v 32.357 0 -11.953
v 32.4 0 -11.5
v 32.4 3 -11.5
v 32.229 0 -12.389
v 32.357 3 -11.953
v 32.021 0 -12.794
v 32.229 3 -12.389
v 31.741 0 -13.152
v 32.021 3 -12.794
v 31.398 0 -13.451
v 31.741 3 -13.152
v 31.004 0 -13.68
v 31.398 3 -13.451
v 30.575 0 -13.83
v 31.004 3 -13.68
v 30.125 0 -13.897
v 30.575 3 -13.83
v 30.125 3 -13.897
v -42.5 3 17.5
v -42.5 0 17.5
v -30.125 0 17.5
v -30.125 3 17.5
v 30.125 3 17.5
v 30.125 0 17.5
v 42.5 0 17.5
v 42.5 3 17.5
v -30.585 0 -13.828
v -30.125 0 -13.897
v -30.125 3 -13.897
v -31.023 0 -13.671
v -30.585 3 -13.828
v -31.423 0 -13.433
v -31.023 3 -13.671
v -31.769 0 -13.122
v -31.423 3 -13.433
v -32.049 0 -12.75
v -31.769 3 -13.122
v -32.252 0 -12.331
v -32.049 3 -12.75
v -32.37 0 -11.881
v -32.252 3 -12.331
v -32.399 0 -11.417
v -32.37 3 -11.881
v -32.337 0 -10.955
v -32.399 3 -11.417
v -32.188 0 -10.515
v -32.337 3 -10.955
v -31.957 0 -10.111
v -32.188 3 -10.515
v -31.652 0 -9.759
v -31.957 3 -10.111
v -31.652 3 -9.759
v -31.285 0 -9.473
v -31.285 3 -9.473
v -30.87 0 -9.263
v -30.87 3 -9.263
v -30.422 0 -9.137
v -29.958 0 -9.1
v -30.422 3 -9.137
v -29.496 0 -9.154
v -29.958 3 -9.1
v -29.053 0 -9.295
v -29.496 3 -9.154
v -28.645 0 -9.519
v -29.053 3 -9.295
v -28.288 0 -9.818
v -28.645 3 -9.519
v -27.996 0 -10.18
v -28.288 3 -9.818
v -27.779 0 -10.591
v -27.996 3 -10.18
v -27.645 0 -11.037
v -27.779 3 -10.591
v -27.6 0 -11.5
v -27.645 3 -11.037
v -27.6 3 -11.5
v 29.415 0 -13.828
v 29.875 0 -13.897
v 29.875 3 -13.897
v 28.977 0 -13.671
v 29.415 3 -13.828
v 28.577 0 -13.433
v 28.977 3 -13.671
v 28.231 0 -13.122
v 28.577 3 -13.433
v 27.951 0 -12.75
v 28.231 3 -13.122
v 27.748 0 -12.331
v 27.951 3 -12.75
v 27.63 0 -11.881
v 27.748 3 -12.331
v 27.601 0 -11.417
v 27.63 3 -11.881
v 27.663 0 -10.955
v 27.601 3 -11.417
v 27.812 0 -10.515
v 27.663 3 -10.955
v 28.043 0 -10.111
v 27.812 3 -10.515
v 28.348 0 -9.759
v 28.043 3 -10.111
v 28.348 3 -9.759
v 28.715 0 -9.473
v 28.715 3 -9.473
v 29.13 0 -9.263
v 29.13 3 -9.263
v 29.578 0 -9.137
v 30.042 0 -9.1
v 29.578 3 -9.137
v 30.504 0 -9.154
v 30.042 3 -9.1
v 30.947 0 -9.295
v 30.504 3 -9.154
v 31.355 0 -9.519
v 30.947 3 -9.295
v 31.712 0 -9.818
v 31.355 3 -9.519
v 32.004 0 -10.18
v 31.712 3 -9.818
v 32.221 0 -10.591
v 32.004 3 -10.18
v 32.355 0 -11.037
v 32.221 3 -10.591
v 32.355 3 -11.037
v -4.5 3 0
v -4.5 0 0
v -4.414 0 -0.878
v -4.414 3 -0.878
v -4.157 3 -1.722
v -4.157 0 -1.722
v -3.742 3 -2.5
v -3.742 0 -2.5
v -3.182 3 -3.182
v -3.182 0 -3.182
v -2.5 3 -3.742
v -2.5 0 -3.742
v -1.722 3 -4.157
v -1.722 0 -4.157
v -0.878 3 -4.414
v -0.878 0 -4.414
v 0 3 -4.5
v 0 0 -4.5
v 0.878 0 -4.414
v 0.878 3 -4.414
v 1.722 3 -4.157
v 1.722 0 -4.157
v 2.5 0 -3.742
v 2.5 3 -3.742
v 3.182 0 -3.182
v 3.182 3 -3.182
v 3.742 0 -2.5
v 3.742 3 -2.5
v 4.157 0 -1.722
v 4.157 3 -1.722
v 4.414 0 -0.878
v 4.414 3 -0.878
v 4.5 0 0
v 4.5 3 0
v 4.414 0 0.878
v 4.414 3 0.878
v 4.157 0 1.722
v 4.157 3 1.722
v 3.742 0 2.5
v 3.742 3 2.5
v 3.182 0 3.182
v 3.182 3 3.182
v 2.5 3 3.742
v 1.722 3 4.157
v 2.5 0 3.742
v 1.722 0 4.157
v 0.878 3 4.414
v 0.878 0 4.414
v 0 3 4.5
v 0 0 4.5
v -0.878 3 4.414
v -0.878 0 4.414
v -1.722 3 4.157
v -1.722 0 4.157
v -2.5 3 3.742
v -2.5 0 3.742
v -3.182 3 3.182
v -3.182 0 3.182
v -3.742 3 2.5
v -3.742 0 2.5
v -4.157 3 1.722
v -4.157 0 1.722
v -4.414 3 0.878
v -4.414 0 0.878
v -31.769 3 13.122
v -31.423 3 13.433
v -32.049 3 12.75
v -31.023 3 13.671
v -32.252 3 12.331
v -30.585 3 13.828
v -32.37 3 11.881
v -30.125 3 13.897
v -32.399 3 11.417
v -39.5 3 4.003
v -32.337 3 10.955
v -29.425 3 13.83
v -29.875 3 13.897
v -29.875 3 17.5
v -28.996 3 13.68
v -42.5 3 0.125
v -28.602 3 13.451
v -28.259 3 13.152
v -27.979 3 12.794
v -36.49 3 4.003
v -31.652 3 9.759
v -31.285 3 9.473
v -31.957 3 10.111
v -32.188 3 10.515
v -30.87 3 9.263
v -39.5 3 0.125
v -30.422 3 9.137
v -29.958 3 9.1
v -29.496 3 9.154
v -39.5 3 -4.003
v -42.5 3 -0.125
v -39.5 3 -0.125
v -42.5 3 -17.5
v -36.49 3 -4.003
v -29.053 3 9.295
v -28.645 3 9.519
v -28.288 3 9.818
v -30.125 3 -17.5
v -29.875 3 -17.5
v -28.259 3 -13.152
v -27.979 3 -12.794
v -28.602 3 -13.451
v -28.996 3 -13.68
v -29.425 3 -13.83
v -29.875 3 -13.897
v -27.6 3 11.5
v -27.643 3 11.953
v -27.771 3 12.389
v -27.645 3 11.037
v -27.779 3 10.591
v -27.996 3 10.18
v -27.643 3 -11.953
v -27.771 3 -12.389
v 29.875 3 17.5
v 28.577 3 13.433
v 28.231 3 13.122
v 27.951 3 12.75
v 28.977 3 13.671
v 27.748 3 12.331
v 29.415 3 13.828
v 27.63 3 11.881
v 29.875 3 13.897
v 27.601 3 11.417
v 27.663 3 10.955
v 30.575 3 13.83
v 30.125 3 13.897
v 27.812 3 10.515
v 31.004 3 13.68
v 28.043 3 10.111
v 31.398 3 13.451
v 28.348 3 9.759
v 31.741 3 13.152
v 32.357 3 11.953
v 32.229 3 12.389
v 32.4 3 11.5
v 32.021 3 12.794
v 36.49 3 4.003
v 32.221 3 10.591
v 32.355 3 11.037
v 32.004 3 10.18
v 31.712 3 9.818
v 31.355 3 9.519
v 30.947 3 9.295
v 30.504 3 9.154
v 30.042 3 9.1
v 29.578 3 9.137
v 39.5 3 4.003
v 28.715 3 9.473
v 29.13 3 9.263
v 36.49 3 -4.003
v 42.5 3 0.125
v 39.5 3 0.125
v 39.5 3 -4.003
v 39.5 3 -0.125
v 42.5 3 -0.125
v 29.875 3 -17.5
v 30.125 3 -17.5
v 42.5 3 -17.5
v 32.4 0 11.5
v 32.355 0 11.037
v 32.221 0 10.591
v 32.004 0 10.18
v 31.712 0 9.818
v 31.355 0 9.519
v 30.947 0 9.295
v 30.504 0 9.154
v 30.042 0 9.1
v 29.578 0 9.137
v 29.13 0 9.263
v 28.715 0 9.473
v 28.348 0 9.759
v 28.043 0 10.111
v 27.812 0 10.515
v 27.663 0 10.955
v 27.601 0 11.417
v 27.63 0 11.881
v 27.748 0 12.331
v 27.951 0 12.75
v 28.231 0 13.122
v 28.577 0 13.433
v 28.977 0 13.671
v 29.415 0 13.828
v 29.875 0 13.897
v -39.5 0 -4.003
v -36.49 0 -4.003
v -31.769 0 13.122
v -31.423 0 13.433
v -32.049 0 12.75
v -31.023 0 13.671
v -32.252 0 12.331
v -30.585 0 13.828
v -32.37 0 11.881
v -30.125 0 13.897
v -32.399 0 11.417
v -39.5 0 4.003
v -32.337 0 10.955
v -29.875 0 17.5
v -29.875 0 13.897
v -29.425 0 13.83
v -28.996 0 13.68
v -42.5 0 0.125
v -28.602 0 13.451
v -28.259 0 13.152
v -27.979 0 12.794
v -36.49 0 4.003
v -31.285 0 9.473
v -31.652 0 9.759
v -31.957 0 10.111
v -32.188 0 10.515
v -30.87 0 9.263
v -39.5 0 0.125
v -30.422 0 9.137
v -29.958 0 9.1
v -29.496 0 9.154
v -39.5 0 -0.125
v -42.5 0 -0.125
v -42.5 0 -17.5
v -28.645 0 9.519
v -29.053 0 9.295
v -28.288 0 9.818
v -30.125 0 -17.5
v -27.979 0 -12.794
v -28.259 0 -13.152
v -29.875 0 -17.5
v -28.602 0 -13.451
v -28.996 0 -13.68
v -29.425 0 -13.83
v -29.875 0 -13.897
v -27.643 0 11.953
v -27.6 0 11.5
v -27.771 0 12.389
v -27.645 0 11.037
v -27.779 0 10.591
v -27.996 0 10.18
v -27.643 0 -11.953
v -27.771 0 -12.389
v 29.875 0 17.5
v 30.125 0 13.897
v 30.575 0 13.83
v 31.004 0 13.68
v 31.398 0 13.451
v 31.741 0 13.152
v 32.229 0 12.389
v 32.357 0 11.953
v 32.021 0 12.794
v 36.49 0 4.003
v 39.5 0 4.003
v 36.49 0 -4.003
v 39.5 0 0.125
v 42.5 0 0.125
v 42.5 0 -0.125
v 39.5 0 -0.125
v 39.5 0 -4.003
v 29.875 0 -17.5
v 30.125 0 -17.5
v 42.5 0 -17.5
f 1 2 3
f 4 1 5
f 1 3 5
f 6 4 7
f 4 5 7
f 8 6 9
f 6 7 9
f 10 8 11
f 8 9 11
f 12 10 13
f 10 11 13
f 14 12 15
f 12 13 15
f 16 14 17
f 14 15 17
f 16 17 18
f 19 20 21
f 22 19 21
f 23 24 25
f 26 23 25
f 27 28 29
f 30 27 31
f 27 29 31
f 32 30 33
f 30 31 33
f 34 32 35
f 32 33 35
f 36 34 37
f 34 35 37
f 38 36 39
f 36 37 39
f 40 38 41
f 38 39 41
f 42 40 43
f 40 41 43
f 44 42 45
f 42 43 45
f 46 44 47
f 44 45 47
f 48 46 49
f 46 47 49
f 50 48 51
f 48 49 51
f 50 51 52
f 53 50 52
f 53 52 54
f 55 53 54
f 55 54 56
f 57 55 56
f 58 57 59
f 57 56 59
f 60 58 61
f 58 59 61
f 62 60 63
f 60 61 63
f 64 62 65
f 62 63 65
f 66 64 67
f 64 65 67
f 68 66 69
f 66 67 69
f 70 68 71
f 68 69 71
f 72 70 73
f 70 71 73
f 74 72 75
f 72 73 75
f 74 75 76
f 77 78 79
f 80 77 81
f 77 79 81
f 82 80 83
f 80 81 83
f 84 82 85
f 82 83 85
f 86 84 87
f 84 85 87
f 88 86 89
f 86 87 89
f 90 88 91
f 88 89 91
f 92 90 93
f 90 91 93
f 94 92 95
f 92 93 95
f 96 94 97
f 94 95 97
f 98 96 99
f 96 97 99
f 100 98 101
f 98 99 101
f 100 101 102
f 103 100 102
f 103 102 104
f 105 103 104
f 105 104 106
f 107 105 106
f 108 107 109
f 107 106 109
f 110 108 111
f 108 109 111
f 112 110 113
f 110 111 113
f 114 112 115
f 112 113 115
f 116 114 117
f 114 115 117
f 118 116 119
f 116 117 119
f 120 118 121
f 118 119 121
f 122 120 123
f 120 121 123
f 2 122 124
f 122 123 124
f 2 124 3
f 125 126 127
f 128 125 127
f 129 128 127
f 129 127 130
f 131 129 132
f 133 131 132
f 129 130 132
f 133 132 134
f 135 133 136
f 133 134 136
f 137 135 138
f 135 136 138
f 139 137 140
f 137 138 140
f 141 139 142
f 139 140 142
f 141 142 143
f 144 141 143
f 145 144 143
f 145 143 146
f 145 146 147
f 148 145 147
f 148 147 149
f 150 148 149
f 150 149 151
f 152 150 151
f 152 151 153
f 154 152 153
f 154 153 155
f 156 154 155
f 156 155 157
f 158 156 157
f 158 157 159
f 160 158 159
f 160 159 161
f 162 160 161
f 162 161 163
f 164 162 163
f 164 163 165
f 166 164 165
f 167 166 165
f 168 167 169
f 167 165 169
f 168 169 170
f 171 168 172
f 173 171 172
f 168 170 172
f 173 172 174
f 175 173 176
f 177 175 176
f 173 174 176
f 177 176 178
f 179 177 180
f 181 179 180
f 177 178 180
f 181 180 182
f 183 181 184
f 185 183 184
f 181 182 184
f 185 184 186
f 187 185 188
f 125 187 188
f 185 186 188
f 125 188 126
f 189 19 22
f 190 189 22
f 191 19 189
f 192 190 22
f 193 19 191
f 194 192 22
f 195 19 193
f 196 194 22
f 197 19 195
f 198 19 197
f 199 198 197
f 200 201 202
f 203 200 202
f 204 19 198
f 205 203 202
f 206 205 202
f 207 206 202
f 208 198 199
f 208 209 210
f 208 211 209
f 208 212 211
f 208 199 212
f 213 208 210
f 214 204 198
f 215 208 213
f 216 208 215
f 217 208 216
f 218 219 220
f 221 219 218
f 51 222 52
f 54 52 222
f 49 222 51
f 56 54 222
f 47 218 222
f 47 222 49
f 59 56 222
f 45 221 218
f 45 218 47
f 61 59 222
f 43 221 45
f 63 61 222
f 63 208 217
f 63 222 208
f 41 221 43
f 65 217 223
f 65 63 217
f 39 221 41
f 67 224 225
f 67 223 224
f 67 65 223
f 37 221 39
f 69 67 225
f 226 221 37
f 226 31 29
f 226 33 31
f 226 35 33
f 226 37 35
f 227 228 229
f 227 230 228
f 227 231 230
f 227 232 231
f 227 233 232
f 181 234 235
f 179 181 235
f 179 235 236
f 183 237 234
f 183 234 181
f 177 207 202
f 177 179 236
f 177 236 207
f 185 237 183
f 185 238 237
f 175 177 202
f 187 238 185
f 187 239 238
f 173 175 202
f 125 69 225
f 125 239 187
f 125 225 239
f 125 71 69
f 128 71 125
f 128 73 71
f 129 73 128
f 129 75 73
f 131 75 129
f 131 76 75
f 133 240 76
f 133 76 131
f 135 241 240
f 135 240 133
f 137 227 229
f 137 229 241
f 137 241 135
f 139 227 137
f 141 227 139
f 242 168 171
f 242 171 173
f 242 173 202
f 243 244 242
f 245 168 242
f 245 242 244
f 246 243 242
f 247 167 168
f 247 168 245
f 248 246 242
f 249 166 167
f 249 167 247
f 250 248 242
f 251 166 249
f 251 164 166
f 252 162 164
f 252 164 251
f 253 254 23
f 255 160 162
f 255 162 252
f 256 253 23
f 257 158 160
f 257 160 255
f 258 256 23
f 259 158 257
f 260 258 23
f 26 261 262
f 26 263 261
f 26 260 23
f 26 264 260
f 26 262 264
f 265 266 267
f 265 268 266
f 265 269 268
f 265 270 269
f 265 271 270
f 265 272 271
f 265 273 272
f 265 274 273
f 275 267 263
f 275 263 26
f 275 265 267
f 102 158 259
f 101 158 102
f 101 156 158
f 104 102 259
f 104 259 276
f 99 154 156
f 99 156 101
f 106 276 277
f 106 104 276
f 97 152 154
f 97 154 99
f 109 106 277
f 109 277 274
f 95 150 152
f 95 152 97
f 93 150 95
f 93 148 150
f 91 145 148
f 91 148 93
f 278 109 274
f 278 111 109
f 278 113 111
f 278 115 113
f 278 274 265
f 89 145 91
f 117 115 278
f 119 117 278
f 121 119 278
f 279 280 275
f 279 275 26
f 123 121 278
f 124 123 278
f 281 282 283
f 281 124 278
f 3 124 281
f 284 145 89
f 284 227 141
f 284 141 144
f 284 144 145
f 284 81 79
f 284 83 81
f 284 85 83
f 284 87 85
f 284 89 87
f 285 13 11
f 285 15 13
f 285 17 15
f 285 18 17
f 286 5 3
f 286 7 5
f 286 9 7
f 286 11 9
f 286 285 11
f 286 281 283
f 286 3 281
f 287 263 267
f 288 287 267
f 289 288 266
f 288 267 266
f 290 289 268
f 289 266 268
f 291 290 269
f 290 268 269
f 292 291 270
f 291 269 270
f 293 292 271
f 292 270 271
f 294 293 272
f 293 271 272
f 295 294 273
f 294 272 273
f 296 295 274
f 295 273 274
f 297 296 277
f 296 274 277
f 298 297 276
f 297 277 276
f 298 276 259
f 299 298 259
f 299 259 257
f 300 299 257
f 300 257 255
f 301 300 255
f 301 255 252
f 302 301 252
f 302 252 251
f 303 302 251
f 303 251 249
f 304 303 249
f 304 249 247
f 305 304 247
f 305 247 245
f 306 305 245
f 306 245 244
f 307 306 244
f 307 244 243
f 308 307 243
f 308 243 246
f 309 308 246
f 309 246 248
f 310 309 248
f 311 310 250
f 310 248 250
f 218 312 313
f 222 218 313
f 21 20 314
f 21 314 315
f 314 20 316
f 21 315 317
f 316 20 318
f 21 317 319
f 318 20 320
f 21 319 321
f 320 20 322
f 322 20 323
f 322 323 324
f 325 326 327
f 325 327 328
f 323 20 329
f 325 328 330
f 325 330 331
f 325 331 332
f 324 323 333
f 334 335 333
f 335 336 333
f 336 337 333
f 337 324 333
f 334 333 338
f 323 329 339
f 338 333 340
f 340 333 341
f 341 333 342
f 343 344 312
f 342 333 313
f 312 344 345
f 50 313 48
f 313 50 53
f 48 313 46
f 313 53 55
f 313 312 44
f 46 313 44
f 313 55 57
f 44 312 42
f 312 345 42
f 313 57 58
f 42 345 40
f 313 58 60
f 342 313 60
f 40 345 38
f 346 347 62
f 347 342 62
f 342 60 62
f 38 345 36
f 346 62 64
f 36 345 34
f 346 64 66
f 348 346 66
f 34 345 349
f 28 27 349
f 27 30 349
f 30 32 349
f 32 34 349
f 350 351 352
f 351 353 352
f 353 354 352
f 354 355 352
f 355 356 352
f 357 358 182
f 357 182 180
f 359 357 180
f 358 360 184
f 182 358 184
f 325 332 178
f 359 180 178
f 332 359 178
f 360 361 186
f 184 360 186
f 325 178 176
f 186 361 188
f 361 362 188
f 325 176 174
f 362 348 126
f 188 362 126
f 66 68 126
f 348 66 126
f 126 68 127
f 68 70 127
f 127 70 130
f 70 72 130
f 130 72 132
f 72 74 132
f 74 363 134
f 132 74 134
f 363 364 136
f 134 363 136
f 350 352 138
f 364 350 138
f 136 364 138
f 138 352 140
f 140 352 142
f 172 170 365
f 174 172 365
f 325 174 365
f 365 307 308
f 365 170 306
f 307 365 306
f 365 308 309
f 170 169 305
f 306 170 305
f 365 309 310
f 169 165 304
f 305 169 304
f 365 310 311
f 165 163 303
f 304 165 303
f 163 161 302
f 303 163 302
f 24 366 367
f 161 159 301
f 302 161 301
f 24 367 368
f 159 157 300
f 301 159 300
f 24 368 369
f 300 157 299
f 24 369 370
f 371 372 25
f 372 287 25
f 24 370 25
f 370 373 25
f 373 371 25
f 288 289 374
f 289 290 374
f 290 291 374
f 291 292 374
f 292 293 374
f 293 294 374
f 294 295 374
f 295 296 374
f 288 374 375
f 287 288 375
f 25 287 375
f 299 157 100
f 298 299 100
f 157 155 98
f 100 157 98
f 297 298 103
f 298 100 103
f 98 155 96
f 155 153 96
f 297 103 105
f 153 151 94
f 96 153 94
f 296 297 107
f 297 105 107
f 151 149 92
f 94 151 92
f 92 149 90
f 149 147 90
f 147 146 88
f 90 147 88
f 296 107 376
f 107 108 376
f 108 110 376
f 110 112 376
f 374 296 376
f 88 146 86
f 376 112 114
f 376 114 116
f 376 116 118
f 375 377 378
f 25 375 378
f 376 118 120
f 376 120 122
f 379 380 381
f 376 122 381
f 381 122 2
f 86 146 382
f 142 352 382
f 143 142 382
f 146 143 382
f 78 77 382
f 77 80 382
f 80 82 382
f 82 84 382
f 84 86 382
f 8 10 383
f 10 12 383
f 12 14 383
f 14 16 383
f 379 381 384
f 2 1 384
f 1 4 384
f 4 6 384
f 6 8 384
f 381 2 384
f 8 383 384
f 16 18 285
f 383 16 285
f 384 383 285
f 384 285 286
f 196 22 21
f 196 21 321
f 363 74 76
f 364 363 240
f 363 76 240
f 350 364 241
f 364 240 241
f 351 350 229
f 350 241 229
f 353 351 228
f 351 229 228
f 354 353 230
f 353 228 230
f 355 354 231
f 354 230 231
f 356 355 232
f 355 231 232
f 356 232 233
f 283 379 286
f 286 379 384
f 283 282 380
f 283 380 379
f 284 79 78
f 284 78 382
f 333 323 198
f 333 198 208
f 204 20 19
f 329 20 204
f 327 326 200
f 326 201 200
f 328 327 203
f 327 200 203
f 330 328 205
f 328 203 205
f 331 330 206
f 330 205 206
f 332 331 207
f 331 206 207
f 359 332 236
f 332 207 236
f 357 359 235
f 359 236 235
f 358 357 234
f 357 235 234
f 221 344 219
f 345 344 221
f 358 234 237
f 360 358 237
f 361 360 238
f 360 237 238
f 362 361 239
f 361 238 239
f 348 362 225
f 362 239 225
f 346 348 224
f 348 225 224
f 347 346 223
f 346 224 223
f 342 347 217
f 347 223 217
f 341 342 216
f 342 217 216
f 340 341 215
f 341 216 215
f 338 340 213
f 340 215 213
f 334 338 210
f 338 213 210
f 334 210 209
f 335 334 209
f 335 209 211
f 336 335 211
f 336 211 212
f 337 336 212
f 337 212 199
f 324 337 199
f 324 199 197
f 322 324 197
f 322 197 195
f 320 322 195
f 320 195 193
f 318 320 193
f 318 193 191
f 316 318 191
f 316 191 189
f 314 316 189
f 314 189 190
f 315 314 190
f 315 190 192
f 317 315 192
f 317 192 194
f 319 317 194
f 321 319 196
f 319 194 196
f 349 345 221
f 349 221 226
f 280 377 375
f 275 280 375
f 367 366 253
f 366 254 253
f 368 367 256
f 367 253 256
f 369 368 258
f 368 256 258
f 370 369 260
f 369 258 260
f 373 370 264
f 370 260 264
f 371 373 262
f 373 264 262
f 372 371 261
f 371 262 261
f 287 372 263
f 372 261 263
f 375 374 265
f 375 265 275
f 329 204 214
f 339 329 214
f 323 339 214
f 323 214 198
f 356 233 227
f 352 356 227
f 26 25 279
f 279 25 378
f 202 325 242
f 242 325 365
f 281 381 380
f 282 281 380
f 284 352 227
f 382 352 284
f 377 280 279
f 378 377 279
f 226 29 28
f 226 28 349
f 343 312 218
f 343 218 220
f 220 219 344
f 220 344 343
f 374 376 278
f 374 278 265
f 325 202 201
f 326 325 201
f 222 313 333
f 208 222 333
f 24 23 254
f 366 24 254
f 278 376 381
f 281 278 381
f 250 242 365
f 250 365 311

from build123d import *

# Parameters (mm, degrees)
ESBO_O2_W                = 85
ESBO_O2_H                = 35
RESSALTO_EXTRUS_O2_DEPTH = 3
ESBO_O3_W                = 3.01
ESBO_O3_H                = 8.005
CORTE_EXTRUS_O1_DEPTH    = 47.059743812
FURO_COM_FOLGA_DE_M41_D  = 4.8
FURO_COM_FOLGA_DE_M81_D  = 9
ESBO_O13_W               = 0.25
ESBO_O13_H               = 3.603257419
ESBO_O13_W_2             = 3
ESBO_O13_H_2             = 0.25
CORTE_EXTRUS_O2_DEPTH    = 47.059743812


with BuildPart() as part:
    # Esboço2 → Ressalto-extrusão2 (new body)
    with BuildSketch(Plane(origin=(0, 0, 0), x_dir=(1, 0, 0), z_dir=(0, 1, 0))):
        Rectangle(ESBO_O2_W, ESBO_O2_H)
    extrude(amount=RESSALTO_EXTRUS_O2_DEPTH)

    # Esboço3 → Corte-extrusão1 (cut, through all)
    with BuildSketch(Plane.XZ):
        with Locations((-37.995, 0)):
            Rectangle(ESBO_O3_W, ESBO_O3_H)
        with Locations((37.995, 0)):
            Rectangle(ESBO_O3_W, ESBO_O3_H)
    extrude(amount=-CORTE_EXTRUS_O1_DEPTH, mode=Mode.SUBTRACT)

    # Furo com folga de M41 (through all)
    with Locations(Plane(origin=(0, 0, 0), x_dir=(-1, 0, 0), z_dir=(0, -1, 0))):
        with Locations((30, -11.5), (30, 11.5), (-30, 11.5), (-30, -11.5)):
            Hole(FURO_COM_FOLGA_DE_M41_D / 2)

    # Furo com folga de M81 (through all)
    with Locations(Plane(origin=(0, 3, 0), x_dir=(1, 0, 0), z_dir=(0, 1, 0))):
        with Locations((0, 0)):
            Hole(FURO_COM_FOLGA_DE_M81_D / 2)

    # Esboço13 → Corte-extrusão2 (cut, through all)
    with BuildSketch(Plane(origin=(0, 3, 0), x_dir=(1, 0, 0), z_dir=(0, 1, 0))):
        with Locations((-30, 15.698371291)):
            Rectangle(ESBO_O13_W, ESBO_O13_H)
        with Locations((-41, 0)):
            Rectangle(ESBO_O13_W_2, ESBO_O13_H_2)
        with Locations((-30, -15.698371291)):
            Rectangle(ESBO_O13_W, ESBO_O13_H)
        with Locations((30, -15.698371291)):
            Rectangle(ESBO_O13_W, ESBO_O13_H)
        with Locations((41, 0)):
            Rectangle(ESBO_O13_W_2, ESBO_O13_H_2)
        with Locations((30, 15.698371291)):
            Rectangle(ESBO_O13_W, ESBO_O13_H)
    extrude(amount=-CORTE_EXTRUS_O2_DEPTH, mode=Mode.SUBTRACT)


solid = part.part
